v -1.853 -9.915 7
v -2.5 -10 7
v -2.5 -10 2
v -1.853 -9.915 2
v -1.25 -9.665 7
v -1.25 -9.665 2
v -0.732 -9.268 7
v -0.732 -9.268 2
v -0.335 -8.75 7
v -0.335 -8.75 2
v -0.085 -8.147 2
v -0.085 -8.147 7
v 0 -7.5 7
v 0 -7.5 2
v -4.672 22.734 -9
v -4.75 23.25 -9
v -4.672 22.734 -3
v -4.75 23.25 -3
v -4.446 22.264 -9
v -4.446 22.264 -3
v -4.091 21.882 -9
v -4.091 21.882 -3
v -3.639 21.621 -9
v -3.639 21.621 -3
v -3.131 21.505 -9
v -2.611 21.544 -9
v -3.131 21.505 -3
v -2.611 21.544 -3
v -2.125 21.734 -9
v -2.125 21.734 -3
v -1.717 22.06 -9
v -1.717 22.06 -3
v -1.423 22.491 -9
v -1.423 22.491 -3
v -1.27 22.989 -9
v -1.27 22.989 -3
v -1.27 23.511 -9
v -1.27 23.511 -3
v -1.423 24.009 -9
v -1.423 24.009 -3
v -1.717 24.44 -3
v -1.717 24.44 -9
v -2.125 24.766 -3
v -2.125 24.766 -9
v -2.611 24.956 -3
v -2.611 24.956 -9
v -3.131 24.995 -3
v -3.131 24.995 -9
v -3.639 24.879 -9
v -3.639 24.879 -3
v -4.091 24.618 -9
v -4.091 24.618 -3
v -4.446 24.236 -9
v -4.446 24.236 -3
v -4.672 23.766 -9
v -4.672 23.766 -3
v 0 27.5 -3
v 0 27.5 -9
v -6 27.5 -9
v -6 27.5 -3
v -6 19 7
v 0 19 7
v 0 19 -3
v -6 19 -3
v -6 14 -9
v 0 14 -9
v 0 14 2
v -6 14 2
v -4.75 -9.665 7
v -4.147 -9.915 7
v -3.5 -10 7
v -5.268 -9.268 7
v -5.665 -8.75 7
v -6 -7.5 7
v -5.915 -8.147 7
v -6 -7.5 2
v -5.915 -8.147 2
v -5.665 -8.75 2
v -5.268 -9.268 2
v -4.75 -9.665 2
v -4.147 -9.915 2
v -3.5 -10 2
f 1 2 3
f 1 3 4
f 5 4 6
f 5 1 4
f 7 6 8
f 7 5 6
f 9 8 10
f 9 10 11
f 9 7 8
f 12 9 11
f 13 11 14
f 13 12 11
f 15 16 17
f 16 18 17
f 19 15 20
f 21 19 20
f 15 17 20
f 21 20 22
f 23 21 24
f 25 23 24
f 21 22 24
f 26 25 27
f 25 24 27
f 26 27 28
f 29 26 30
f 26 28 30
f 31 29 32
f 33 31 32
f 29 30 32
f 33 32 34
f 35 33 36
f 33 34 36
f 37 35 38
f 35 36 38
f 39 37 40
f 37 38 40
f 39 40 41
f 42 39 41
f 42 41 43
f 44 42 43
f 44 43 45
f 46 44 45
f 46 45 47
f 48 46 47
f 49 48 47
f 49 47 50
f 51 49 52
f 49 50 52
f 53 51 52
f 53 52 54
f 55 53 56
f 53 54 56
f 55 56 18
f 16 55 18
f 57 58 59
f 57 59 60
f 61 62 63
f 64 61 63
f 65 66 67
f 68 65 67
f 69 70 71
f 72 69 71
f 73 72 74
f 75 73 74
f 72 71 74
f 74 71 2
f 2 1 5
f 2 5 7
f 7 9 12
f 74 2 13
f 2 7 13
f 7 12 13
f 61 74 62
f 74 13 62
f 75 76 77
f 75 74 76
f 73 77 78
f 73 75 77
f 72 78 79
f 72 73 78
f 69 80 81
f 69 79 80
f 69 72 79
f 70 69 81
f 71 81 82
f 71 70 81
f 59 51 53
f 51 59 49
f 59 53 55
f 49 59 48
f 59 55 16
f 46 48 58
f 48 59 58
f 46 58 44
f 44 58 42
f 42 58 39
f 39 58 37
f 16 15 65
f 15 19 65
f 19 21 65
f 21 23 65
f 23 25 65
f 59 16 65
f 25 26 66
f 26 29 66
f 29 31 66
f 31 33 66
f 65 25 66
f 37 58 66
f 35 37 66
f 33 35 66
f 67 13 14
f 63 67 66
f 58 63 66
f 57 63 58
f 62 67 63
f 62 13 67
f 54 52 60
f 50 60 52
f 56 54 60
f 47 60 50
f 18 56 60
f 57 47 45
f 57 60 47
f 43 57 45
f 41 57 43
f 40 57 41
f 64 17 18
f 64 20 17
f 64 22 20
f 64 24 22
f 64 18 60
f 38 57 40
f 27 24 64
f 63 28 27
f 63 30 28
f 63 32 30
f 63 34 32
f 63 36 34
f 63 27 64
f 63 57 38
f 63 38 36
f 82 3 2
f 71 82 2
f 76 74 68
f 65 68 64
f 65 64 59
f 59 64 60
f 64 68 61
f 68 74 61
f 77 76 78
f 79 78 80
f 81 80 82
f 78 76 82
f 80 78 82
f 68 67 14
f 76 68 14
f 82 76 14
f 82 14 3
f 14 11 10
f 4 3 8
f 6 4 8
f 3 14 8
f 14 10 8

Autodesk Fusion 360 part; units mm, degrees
sketch "Sketch1" plane through (0, 0, 0) normal (0, 0, 1) x (1, 0, 0)
  circle A0 centre (0, 0) radius 1.75
  circle A1 centre (0, 0) radius 5
  circle A2 centre (0, 0) radius 3.5
  circle A3 centre (-26, 0) radius 4
  line L0 (-25.9137, 3.9991) -> (-3.0012, 3.9991)
  line L1 (-25.9137, -3.9991) -> (-3.0012, -3.9991)
  dimension "d1" = 3.5
  dimension "d2" = 10
  dimension "d3" = 7
  dimension "d4" = 8
extrude "Extrude1" add sketch "Sketch1" against normal blind 18 contours A1 makes body 1
extrude "Extrude2" add sketch "Sketch1" along normal blind -12 and the other way blind 18 contours A2 bodies 1
extrude "Extrude3" add sketch "Sketch1" against normal blind 6 contours A1 A3 L0 L1 | A3 bodies 1
sketch "Sketch2" plane through (0, 0, 0) normal (1, 0, 0) x (0, 1, 0)
  line L0 (-10, 7) -> (14, 7)
  line L1 (14, 7) -> (14, 2)
  line L2 (14, 2) -> (-10, 2)
  line L3 (-10, 2) -> (-10, 7)
  line L4 (14, 7) -> (19, 7)
  line L5 (19, 7) -> (19, -9)
  line L6 (19, -9) -> (14, -9)
  line L7 (14, -9) -> (14, 7)
  line L8 (19, -9) -> (27.5, -9)
  line L9 (27.5, -9) -> (27.5, -3)
  line L10 (27.5, -3) -> (19, -3)
  line L11 (19, -3) -> (19, -9)
extrude "Extrude4" add sketch "Sketch2" against normal blind 6 separate body makes body 2
sketch "Sketch3" plane through (0, 0, -3) normal (0, 0, 1) x (-1, 0, 0)
  line L0 (0, -19) -> (0, -27.5)
  line L1 (0, -27.5) -> (6, -27.5)
  line L2 (6, -27.5) -> (6, -19)
  line L3 (6, -19) -> (0, -19)
  circle A0 centre (3, -23.25) radius 1.75
  dimension "d15" = 3.5
extrude "Extrude5" cut sketch "Sketch3" against normal blind 15 contours A0 bodies 2
fillet "Fillet1" radius 2.5 2 edges at (-6, -10, 4.5) (0, -10, 4.5) on bodies 2
hidden bodies 1
